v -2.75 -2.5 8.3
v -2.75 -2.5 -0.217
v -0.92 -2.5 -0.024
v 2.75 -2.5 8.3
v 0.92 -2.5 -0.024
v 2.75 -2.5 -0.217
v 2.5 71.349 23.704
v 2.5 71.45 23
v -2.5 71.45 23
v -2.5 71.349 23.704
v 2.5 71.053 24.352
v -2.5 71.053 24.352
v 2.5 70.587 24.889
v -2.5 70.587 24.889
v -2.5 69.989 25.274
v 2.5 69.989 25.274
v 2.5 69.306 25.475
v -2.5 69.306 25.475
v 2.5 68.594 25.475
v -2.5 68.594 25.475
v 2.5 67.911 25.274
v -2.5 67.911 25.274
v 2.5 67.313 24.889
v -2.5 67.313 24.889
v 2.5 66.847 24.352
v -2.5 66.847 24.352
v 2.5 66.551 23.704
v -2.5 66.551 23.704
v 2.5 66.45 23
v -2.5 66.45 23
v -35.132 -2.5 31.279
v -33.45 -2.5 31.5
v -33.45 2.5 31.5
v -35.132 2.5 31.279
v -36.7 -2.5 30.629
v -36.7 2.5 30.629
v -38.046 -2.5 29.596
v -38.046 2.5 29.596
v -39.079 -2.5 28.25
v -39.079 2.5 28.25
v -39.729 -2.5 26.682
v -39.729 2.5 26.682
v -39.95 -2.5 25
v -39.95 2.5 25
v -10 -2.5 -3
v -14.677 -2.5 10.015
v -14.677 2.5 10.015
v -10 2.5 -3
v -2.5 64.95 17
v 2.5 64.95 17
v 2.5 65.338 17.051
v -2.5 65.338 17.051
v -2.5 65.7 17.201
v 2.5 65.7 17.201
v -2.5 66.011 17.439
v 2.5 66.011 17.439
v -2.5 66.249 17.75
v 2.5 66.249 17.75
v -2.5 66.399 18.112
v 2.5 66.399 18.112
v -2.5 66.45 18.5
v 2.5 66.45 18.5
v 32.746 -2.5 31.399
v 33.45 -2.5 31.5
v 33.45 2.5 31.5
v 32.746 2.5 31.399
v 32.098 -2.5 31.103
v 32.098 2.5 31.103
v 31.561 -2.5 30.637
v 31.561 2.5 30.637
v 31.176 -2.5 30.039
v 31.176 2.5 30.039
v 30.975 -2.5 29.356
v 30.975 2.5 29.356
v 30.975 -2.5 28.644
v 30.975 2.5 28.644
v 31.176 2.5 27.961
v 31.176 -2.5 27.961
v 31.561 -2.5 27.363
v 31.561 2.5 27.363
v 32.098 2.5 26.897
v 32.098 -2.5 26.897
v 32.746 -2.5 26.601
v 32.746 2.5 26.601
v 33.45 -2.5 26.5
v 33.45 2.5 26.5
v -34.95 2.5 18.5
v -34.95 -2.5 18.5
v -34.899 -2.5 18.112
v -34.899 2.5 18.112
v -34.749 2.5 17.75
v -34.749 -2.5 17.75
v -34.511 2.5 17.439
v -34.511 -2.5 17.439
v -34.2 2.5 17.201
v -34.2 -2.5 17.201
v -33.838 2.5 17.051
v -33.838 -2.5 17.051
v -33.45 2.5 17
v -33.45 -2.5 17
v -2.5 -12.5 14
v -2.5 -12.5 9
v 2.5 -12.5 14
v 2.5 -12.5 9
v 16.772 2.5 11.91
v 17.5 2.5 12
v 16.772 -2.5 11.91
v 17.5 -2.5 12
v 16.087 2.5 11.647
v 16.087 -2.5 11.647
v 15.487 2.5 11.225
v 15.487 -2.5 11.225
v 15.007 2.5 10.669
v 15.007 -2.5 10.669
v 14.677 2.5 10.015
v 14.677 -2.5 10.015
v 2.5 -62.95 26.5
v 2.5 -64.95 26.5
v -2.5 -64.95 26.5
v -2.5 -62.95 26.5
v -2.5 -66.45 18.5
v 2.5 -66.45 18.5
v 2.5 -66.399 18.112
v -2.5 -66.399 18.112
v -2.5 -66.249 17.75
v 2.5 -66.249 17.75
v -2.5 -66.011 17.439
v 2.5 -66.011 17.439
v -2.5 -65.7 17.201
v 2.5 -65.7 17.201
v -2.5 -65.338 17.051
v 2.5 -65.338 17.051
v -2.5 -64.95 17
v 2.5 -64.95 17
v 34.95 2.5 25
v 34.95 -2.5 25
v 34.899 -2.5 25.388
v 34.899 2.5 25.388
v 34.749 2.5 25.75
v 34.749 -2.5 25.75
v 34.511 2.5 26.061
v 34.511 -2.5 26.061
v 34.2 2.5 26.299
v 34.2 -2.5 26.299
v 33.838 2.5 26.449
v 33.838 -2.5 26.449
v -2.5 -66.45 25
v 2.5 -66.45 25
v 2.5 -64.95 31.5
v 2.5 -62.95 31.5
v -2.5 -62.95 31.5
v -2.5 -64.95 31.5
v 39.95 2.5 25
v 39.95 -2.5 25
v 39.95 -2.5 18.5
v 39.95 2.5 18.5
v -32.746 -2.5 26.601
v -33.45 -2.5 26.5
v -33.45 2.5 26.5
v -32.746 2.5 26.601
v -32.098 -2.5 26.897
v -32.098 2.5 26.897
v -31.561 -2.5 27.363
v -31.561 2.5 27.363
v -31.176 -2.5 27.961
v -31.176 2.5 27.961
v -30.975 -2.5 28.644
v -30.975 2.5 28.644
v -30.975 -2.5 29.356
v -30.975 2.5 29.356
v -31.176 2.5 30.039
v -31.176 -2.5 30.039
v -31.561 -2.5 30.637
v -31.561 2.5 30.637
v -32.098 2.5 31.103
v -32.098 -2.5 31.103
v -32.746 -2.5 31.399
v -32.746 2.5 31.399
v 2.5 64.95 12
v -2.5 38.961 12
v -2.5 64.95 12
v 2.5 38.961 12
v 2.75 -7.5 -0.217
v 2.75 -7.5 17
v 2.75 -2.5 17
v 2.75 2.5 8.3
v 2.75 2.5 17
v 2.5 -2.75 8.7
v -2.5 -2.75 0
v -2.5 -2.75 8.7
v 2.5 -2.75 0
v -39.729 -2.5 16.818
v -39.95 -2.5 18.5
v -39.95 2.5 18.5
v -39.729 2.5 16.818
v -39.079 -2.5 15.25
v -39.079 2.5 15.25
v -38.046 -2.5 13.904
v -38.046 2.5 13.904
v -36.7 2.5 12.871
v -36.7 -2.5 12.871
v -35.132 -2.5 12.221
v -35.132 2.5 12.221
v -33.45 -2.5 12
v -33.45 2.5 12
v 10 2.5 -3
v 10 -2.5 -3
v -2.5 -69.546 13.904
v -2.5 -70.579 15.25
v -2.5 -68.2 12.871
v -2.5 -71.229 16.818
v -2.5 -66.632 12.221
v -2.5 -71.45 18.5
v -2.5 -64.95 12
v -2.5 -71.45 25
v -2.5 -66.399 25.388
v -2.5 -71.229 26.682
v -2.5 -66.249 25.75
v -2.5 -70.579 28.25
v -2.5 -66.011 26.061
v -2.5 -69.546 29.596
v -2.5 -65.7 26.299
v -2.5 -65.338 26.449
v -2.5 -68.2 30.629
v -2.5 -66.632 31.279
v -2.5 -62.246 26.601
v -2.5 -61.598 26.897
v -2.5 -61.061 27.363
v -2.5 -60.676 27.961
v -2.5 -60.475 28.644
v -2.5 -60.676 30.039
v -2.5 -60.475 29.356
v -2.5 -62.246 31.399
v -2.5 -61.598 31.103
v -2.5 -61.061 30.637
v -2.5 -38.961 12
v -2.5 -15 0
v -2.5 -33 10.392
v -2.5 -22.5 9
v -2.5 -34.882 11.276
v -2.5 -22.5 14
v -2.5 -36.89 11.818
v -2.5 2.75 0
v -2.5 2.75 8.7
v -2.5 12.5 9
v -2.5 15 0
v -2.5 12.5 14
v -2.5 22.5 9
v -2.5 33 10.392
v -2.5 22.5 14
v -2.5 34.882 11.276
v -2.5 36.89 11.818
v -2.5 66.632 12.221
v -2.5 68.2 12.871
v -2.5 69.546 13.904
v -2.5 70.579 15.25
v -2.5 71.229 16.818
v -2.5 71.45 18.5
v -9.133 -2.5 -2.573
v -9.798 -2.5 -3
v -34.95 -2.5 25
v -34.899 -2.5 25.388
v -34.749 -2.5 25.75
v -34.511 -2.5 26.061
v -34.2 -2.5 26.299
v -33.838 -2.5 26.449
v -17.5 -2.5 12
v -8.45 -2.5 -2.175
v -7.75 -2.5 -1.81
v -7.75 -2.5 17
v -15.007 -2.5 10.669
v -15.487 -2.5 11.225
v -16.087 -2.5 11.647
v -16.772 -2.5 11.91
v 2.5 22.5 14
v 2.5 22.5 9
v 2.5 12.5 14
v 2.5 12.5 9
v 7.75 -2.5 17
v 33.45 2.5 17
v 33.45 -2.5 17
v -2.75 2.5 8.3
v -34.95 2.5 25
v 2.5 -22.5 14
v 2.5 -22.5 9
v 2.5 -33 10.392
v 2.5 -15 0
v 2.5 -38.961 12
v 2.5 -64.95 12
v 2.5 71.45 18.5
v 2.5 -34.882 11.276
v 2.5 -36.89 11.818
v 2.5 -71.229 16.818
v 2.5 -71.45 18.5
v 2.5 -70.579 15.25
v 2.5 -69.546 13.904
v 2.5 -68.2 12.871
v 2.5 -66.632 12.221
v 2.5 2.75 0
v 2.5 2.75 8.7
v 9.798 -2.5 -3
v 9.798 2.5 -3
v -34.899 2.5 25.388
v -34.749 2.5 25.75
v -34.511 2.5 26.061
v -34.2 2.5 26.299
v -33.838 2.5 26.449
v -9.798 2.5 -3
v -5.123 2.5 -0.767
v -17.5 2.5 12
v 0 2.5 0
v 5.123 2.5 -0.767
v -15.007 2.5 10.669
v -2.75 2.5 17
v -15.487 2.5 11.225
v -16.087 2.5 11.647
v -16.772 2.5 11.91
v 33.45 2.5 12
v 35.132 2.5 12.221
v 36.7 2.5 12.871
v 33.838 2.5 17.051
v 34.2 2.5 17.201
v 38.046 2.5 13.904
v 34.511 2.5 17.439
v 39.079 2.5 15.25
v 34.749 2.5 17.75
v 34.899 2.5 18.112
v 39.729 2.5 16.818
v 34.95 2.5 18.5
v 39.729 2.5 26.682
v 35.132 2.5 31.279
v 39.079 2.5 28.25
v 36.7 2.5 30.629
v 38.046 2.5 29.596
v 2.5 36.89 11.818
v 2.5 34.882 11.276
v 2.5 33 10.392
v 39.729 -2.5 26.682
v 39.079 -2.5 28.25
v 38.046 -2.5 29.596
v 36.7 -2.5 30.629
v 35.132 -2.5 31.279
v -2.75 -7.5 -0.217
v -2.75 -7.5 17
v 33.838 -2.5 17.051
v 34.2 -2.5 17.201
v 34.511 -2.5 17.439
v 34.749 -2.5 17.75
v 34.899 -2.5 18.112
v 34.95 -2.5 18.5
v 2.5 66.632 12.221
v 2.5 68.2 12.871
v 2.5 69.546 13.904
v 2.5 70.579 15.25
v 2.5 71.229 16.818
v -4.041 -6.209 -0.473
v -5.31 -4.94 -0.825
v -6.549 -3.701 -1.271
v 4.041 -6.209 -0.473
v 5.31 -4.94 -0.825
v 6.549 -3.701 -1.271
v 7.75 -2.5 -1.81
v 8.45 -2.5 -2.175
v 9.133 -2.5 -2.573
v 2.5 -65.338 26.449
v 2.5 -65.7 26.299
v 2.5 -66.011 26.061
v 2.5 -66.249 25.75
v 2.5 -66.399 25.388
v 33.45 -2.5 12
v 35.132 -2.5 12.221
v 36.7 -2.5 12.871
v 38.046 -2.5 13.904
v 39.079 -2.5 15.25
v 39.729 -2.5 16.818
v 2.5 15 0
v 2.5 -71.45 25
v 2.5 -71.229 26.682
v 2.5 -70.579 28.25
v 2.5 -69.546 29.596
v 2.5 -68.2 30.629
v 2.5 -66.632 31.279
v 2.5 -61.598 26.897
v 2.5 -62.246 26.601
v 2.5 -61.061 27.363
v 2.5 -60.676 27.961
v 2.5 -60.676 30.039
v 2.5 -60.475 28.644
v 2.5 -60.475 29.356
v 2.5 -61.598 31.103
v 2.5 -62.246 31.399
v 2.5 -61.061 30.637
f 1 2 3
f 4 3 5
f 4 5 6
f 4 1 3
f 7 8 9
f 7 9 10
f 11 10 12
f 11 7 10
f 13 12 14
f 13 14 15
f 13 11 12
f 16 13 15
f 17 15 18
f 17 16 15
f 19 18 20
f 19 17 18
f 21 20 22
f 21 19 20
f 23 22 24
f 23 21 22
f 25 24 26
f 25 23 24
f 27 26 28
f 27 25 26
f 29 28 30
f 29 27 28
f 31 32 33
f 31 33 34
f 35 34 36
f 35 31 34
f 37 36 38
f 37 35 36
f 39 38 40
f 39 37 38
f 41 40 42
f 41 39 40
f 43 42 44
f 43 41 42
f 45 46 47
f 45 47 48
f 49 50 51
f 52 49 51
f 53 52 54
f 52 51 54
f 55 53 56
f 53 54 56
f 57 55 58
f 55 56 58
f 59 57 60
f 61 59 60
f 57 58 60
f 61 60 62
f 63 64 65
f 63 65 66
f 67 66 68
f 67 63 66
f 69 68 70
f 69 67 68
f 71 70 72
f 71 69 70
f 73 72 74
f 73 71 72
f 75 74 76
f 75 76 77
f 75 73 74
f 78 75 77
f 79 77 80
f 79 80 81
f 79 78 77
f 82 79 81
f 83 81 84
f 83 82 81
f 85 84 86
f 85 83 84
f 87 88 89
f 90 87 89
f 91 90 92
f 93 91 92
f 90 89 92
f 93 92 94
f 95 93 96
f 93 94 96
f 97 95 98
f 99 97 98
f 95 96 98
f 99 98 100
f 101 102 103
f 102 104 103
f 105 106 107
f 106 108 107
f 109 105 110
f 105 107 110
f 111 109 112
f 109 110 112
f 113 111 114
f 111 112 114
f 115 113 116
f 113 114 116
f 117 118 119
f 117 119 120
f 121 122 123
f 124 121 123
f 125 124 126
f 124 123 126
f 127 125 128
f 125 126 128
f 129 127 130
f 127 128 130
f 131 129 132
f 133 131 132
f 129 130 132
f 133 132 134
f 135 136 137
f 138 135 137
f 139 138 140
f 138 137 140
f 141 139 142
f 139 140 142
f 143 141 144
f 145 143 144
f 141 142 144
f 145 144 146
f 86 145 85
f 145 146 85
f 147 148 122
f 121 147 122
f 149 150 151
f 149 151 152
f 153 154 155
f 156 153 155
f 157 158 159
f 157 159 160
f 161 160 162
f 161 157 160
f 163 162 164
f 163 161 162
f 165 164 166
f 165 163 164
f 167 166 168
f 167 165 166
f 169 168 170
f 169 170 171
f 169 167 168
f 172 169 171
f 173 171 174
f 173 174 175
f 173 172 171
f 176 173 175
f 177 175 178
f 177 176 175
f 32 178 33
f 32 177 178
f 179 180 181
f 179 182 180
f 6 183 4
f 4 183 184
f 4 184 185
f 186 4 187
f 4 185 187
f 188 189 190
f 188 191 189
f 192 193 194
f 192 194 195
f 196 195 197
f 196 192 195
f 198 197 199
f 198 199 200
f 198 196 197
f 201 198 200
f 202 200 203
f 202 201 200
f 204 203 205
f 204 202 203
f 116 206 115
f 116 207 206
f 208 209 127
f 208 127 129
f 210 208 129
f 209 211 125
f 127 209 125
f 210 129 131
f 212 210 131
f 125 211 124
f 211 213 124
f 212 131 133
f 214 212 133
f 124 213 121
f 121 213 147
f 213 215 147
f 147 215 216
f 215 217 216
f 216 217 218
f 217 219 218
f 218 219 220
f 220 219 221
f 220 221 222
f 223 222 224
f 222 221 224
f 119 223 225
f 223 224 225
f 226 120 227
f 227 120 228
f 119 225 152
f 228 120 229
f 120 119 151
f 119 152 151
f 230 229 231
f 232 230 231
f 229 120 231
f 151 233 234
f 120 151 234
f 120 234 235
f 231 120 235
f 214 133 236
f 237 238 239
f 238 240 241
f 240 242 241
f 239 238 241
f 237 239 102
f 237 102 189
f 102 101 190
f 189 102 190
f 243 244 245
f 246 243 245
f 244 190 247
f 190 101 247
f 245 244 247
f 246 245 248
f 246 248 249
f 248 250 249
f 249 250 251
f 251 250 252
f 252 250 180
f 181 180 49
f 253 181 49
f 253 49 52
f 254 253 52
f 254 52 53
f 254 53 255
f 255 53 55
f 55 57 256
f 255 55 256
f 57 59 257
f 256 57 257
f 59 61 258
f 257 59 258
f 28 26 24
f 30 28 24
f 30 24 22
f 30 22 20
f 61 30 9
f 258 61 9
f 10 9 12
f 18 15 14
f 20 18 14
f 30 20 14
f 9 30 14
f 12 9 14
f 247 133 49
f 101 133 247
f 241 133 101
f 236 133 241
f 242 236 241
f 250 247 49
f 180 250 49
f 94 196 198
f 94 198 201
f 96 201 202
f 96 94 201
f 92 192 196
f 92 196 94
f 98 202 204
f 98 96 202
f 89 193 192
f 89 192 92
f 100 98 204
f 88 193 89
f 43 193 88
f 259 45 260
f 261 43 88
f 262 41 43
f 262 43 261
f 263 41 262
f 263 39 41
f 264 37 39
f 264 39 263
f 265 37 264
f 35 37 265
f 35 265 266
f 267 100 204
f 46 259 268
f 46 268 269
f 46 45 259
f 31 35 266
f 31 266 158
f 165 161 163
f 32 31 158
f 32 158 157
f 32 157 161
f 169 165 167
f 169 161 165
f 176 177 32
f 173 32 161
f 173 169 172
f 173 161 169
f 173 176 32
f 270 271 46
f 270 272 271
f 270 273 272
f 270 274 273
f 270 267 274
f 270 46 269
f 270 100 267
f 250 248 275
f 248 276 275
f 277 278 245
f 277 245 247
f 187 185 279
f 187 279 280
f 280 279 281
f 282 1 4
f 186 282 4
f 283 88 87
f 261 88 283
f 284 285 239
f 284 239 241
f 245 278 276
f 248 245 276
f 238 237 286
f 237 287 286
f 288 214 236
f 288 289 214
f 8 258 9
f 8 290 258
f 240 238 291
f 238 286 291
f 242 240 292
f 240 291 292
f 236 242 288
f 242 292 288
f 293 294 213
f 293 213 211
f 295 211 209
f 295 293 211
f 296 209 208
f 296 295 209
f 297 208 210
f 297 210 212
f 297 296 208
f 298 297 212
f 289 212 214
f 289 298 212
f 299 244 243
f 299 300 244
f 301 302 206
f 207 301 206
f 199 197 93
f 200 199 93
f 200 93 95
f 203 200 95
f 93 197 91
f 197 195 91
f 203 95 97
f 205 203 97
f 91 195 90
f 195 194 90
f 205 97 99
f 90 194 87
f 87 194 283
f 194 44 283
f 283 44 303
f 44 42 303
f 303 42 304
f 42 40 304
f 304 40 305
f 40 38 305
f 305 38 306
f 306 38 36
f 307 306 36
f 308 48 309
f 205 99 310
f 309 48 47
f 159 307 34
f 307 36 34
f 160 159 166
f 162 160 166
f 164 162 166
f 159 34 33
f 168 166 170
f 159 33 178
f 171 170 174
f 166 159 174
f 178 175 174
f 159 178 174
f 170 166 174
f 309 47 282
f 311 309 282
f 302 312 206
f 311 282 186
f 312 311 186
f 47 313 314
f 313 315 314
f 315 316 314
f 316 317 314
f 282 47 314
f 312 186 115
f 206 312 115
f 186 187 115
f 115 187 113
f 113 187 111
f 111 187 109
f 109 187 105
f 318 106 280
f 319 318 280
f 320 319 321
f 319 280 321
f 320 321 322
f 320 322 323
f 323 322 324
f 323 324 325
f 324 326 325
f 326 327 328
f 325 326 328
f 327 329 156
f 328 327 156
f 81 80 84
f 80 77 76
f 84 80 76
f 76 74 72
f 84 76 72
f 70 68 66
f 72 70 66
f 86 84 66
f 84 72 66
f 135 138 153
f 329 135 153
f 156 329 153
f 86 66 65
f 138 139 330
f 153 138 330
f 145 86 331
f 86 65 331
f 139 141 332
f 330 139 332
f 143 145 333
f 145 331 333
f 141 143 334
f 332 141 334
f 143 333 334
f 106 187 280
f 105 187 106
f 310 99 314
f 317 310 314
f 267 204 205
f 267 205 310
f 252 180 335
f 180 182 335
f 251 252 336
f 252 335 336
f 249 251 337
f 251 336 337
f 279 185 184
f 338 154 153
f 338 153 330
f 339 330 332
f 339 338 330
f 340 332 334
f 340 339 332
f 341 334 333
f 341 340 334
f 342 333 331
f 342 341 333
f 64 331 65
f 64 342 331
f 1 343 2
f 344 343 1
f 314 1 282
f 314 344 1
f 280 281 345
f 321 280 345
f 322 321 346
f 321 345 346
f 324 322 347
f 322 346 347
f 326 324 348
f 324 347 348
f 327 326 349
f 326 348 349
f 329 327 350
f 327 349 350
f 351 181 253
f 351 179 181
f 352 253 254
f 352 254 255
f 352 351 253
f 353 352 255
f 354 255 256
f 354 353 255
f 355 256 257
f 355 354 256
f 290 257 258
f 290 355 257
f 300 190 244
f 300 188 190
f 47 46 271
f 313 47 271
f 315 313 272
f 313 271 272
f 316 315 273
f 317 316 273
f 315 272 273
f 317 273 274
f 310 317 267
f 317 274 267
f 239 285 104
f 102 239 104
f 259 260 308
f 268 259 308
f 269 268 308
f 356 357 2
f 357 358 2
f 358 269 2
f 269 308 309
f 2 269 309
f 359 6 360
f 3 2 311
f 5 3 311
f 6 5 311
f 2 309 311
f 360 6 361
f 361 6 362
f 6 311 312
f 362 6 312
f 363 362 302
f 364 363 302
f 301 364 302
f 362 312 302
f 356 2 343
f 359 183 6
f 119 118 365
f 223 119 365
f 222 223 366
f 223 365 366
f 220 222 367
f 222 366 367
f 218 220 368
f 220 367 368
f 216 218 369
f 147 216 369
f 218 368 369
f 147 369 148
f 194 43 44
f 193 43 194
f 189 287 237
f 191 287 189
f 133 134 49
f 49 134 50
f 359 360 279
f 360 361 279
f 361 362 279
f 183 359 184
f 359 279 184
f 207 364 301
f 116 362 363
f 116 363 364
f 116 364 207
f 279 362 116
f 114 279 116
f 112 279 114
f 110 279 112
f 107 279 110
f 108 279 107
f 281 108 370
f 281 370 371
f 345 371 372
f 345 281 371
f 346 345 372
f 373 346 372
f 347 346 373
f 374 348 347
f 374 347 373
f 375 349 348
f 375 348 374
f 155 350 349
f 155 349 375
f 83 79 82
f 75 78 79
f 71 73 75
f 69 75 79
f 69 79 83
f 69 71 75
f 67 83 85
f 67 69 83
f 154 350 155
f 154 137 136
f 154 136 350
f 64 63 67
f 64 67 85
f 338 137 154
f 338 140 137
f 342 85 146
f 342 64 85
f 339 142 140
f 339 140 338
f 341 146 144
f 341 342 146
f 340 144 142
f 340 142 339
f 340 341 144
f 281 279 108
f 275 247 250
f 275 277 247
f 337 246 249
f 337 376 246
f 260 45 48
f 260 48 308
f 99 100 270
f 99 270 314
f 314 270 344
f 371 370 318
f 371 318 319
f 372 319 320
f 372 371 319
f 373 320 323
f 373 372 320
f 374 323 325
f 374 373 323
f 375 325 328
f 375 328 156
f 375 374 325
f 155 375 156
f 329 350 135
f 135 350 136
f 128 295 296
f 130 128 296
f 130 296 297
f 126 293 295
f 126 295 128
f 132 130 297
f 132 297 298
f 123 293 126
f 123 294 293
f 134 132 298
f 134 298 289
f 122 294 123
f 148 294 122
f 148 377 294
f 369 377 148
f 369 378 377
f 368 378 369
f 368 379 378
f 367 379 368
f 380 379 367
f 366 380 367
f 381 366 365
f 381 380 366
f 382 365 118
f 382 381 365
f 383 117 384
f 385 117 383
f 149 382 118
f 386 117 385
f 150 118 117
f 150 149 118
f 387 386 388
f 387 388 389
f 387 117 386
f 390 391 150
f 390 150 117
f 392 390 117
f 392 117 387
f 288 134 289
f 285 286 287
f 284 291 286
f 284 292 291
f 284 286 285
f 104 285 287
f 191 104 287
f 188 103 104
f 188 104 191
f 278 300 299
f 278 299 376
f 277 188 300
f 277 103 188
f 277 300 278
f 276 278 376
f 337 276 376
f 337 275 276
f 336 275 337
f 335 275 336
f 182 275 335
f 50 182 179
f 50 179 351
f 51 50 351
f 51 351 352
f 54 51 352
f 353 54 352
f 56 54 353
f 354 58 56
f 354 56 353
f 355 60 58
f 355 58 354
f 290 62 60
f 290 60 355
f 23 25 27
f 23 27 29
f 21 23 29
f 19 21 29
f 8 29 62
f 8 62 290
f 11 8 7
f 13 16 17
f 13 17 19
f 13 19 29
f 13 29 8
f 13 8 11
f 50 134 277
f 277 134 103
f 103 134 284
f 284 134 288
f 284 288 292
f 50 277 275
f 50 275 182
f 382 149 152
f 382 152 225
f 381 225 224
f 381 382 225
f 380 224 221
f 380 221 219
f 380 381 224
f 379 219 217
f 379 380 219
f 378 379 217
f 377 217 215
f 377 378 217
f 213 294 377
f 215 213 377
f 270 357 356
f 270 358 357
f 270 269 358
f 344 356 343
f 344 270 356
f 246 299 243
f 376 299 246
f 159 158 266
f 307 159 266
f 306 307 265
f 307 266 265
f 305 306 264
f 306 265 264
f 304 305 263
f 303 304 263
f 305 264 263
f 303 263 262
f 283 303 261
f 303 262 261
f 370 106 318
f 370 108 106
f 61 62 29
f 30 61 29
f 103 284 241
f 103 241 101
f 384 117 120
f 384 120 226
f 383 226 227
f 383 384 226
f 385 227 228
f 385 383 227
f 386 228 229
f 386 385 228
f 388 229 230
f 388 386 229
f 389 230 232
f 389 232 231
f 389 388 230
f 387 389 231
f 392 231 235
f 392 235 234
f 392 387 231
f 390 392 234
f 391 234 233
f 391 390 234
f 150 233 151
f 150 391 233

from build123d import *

# Parameters (mm, degrees)
SKETCH_W     = 10
SKETCH_H     = 5
PAD_DEPTH    = 2.5
PAD001_DEPTH = 2.5
PAD002_DEPTH = 20
POCKET_DEPTH = 10


with BuildPart() as vertical:
    # Sketch → Pad (new body, symmetric)
    with BuildSketch(Plane.YZ):
        with BuildLine():
            Line((71.45, 18.5), (71.45, 22.999999))
            ThreePointArc((71.45, 22.999999), (68.95, 25.5), (66.45, 23))
            Line((66.45, 18.500001), (66.45, 23))
            ThreePointArc((64.950002, 17), (66.010661, 17.439341), (66.45, 18.500001))
            Line((-64.950002, 17), (64.950002, 17))
            ThreePointArc((-66.45, 18.500001), (-66.010661, 17.439341), (-64.950002, 17))
            Line((-66.45, 24.999999), (-66.45, 18.500001))
            ThreePointArc((-64.950002, 26.5), (-66.010661, 26.060659), (-66.45, 24.999999))
            Line((-64.950002, 26.5), (-62.950002, 26.5))
            ThreePointArc((-62.950002, 26.5), (-60.450002, 29), (-62.950002, 31.5))
            Line((-62.950002, 31.5), (-64.950002, 31.5))
            ThreePointArc((-64.950002, 31.5), (-69.546195, 29.596193), (-71.45, 25))
            Line((-71.45, 18.5), (-71.45, 25))
            ThreePointArc((-71.45, 18.5), (-69.546195, 13.903807), (-64.950001, 12))
            Line((-64.950001, 12), (-38.96077, 12))
            ThreePointArc((-33, 10.392302), (-35.873884, 11.59102), (-38.96077, 12))
            Line((-15, 0), (-33, 10.392302))
            Line((-15, 0), (-2.75, 0))
            Line((-2.75, 0), (-2.75, 8.7))
            Line((-2.75, 8.7), (2.75, 8.7))
            Line((2.75, 8.7), (2.75, 0))
            Line((2.75, 0), (15, 0))
            Line((15, 0), (33, 10.392302))
            ThreePointArc((38.96077, 12), (35.873884, 11.59102), (33, 10.392302))
            Line((38.96077, 12), (64.95, 12))
            ThreePointArc((64.95, 12), (69.546194, 13.903806), (71.45, 18.5))
        make_face()
        with Locations((-17.5, 11.5)):
            Rectangle(SKETCH_W, SKETCH_H, mode=Mode.SUBTRACT)
        with Locations((17.5, 11.5)):
            Rectangle(SKETCH_W, SKETCH_H, mode=Mode.SUBTRACT)
    extrude(amount=PAD_DEPTH, both=True)


with BuildPart() as fusion:
    # Sketch001 → Pad001 (new body, symmetric)
    with BuildSketch(Plane.XZ):
        with BuildLine():
            Line((17.5, 12.000001), (33.450002, 12))
            ThreePointArc((33.450002, 12), (38.046195, 13.903807), (39.95, 18.500001))
            Line((39.95, 24.999999), (39.95, 18.500001))
            ThreePointArc((39.95, 24.999999), (38.046196, 29.596193), (33.450003, 31.500001))
            ThreePointArc((33.450003, 31.500001), (30.950003, 29.000001), (33.450003, 26.500001))
            ThreePointArc((34.95, 24.999999), (34.510662, 26.060659), (33.450003, 26.500001))
            Line((34.95, 18.500002), (34.95, 24.999999))
            ThreePointArc((33.450003, 17), (34.510662, 17.439341), (34.95, 18.500002))
            Line((2.75, 17), (33.450003, 17))
            Line((2.75, 8.3), (2.75, 17))
            Line((-2.75, 8.3), (2.75, 8.3))
            Line((-2.75, 17.000001), (-2.75, 8.3))
            Line((-33.45, 17.000001), (-2.75, 17.000001))
            ThreePointArc((-34.95, 18.500002), (-34.51066, 17.439341), (-33.45, 17.000001))
            Line((-34.95, 18.500002), (-34.95, 24.999999))
            ThreePointArc((-33.450003, 26.500001), (-34.510662, 26.060659), (-34.95, 24.999999))
            ThreePointArc((-33.450003, 26.500001), (-30.950003, 29.000001), (-33.450003, 31.500001))
            ThreePointArc((-33.450003, 31.500001), (-38.046196, 29.596193), (-39.95, 24.999999))
            Line((-39.95, 24.999999), (-39.95, 18.500002))
            ThreePointArc((-39.95, 18.500002), (-38.046195, 13.903808), (-33.450003, 12.000001))
            Line((-33.450003, 12.000001), (-17.5, 12.000001))
            ThreePointArc((-14.676752, 10.014531), (-15.774252, 11.453935), (-17.5, 12.000001))
            Line((-14.676752, 10.014531), (-10, -3))
            Line((-10, -3), (10, -3))
            Line((10, -3), (14.676752, 10.014531))
            ThreePointArc((17.5, 12.000001), (15.774252, 11.453936), (14.676752, 10.014531))
        make_face()
    extrude(amount=PAD001_DEPTH, both=True)

    # Sketch002 → Pad002 (new body)
    with BuildSketch(Plane(origin=(0, 0, 17.000001), x_dir=(-1, 0, 0), z_dir=(0, 0, 1))):
        Polygon((-7.75, 2.5), (-2.75, 7.5), (-2.75, 2.5), align=None)
        Polygon((2.75, 7.5), (2.75, 2.5), (7.75, 2.5), align=None)
    extrude(amount=-PAD002_DEPTH)

    # Sketch003 → Pocket (cut)
    with BuildSketch(Plane(origin=(0, 2.5, 0), x_dir=(1, 0, 0), z_dir=(0, 1, 0))):
        with BuildLine():
            ThreePointArc((-10, 3.138593), (0, 0), (10, 3.138593))
            Line((-10, 3.138593), (10, 3.138593))
        make_face()
    extrude(amount=-POCKET_DEPTH, mode=Mode.SUBTRACT)

    # Fusion: union Vertical
    add(vertical.part)


solid = fusion.part
